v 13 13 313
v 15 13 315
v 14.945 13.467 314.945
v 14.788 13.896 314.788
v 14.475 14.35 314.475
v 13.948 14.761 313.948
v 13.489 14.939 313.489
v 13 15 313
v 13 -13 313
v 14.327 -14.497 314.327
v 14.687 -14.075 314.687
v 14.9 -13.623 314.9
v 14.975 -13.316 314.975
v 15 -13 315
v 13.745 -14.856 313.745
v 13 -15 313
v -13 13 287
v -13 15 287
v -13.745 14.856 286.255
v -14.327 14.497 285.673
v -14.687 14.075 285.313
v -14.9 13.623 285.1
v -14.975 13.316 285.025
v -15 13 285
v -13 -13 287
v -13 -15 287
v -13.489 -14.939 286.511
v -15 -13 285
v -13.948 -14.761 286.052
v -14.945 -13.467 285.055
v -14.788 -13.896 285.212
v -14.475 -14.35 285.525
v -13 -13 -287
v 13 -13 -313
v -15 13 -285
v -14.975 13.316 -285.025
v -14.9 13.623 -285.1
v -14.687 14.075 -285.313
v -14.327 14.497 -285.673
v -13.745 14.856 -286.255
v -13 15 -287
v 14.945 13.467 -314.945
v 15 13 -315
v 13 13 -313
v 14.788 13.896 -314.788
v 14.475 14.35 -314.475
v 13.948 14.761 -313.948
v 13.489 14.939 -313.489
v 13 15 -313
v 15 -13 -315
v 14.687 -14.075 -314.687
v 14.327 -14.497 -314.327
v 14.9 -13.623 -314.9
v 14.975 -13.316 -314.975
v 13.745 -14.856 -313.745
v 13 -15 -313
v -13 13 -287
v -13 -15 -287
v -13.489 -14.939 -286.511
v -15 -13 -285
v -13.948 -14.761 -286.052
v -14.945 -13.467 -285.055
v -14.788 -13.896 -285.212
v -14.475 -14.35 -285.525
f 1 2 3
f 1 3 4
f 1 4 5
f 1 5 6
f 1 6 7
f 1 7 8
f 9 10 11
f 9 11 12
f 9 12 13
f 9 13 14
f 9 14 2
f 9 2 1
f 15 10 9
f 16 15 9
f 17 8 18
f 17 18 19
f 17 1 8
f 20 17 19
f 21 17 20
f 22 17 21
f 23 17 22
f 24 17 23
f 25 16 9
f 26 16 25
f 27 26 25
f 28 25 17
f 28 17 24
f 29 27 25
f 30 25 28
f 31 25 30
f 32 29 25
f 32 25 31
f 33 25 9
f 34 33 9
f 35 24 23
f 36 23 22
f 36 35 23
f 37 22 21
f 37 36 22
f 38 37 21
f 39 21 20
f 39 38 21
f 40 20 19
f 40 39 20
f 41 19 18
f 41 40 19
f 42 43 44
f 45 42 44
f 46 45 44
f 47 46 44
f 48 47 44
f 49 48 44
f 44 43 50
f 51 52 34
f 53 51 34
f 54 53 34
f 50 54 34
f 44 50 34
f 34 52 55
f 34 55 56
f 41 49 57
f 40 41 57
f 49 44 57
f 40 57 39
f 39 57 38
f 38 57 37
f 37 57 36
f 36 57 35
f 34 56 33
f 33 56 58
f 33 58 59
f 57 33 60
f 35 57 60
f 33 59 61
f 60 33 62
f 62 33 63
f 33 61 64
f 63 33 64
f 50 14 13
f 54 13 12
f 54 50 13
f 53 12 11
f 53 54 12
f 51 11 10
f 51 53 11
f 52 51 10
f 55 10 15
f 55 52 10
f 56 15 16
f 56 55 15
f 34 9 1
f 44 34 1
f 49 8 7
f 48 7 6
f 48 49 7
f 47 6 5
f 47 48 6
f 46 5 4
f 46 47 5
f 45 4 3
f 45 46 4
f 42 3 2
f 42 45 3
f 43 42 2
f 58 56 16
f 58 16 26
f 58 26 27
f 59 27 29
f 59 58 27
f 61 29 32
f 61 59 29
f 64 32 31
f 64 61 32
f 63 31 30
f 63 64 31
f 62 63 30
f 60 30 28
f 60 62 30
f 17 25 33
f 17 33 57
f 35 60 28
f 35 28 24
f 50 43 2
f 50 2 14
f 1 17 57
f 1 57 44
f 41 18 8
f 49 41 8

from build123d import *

# Parameters (mm, degrees)
Y_KSEKLIK_EKSTR_ZYON1_DEPTH      = 315
Y_KSEKLIK_EKSTR_ZYON1_DEPTH_BACK = 315
IZIM1_W                          = 26
IZIM1_H                          = 26
KES_EKSTR_ZYON1_DEPTH            = 250
KES_EKSTR_ZYON1_DEPTH_BACK       = 250


with BuildPart() as part:
    # Çizim1 → Yükseklik-Ekstrüzyon1 (new, two sides: drawn at the far end of the back side and taken through both)
    with BuildSketch(Plane.XY.offset(-Y_KSEKLIK_EKSTR_ZYON1_DEPTH_BACK)):
        with BuildLine():
            Line((-13, 15), (13, 15))
            ThreePointArc((13, 15), (14.414213562, 14.414213562), (15, 13))
            Line((15, 13), (15, -13))
            ThreePointArc((15, -13), (14.414213562, -14.414213562), (13, -15))
            Line((13, -15), (-13, -15))
            ThreePointArc((-13, -15), (-14.414213562, -14.414213562), (-15, -13))
            Line((-15, -13), (-15, 13))
            ThreePointArc((-15, 13), (-14.414213562, 14.414213562), (-13, 15))
        make_face()
        Rectangle(IZIM1_W, IZIM1_H, mode=Mode.SUBTRACT)
    extrude(amount=Y_KSEKLIK_EKSTR_ZYON1_DEPTH + Y_KSEKLIK_EKSTR_ZYON1_DEPTH_BACK)

    # Çizim2 → Kes-Ekstrüzyon1 (cut, two sides: drawn at the far end of the back side and taken through both)
    with BuildSketch(Plane(origin=(0, 0, 0), x_dir=(1, 0, 0), z_dir=(0, 1, 0)).offset(-KES_EKSTR_ZYON1_DEPTH_BACK)):
        Polygon((15, 315), (-15, 285), (-15, 315), align=None)
        Polygon((15, -315), (-15, -285), (-15, -315), align=None)
    extrude(amount=KES_EKSTR_ZYON1_DEPTH + KES_EKSTR_ZYON1_DEPTH_BACK, mode=Mode.SUBTRACT)


solid = part.part
